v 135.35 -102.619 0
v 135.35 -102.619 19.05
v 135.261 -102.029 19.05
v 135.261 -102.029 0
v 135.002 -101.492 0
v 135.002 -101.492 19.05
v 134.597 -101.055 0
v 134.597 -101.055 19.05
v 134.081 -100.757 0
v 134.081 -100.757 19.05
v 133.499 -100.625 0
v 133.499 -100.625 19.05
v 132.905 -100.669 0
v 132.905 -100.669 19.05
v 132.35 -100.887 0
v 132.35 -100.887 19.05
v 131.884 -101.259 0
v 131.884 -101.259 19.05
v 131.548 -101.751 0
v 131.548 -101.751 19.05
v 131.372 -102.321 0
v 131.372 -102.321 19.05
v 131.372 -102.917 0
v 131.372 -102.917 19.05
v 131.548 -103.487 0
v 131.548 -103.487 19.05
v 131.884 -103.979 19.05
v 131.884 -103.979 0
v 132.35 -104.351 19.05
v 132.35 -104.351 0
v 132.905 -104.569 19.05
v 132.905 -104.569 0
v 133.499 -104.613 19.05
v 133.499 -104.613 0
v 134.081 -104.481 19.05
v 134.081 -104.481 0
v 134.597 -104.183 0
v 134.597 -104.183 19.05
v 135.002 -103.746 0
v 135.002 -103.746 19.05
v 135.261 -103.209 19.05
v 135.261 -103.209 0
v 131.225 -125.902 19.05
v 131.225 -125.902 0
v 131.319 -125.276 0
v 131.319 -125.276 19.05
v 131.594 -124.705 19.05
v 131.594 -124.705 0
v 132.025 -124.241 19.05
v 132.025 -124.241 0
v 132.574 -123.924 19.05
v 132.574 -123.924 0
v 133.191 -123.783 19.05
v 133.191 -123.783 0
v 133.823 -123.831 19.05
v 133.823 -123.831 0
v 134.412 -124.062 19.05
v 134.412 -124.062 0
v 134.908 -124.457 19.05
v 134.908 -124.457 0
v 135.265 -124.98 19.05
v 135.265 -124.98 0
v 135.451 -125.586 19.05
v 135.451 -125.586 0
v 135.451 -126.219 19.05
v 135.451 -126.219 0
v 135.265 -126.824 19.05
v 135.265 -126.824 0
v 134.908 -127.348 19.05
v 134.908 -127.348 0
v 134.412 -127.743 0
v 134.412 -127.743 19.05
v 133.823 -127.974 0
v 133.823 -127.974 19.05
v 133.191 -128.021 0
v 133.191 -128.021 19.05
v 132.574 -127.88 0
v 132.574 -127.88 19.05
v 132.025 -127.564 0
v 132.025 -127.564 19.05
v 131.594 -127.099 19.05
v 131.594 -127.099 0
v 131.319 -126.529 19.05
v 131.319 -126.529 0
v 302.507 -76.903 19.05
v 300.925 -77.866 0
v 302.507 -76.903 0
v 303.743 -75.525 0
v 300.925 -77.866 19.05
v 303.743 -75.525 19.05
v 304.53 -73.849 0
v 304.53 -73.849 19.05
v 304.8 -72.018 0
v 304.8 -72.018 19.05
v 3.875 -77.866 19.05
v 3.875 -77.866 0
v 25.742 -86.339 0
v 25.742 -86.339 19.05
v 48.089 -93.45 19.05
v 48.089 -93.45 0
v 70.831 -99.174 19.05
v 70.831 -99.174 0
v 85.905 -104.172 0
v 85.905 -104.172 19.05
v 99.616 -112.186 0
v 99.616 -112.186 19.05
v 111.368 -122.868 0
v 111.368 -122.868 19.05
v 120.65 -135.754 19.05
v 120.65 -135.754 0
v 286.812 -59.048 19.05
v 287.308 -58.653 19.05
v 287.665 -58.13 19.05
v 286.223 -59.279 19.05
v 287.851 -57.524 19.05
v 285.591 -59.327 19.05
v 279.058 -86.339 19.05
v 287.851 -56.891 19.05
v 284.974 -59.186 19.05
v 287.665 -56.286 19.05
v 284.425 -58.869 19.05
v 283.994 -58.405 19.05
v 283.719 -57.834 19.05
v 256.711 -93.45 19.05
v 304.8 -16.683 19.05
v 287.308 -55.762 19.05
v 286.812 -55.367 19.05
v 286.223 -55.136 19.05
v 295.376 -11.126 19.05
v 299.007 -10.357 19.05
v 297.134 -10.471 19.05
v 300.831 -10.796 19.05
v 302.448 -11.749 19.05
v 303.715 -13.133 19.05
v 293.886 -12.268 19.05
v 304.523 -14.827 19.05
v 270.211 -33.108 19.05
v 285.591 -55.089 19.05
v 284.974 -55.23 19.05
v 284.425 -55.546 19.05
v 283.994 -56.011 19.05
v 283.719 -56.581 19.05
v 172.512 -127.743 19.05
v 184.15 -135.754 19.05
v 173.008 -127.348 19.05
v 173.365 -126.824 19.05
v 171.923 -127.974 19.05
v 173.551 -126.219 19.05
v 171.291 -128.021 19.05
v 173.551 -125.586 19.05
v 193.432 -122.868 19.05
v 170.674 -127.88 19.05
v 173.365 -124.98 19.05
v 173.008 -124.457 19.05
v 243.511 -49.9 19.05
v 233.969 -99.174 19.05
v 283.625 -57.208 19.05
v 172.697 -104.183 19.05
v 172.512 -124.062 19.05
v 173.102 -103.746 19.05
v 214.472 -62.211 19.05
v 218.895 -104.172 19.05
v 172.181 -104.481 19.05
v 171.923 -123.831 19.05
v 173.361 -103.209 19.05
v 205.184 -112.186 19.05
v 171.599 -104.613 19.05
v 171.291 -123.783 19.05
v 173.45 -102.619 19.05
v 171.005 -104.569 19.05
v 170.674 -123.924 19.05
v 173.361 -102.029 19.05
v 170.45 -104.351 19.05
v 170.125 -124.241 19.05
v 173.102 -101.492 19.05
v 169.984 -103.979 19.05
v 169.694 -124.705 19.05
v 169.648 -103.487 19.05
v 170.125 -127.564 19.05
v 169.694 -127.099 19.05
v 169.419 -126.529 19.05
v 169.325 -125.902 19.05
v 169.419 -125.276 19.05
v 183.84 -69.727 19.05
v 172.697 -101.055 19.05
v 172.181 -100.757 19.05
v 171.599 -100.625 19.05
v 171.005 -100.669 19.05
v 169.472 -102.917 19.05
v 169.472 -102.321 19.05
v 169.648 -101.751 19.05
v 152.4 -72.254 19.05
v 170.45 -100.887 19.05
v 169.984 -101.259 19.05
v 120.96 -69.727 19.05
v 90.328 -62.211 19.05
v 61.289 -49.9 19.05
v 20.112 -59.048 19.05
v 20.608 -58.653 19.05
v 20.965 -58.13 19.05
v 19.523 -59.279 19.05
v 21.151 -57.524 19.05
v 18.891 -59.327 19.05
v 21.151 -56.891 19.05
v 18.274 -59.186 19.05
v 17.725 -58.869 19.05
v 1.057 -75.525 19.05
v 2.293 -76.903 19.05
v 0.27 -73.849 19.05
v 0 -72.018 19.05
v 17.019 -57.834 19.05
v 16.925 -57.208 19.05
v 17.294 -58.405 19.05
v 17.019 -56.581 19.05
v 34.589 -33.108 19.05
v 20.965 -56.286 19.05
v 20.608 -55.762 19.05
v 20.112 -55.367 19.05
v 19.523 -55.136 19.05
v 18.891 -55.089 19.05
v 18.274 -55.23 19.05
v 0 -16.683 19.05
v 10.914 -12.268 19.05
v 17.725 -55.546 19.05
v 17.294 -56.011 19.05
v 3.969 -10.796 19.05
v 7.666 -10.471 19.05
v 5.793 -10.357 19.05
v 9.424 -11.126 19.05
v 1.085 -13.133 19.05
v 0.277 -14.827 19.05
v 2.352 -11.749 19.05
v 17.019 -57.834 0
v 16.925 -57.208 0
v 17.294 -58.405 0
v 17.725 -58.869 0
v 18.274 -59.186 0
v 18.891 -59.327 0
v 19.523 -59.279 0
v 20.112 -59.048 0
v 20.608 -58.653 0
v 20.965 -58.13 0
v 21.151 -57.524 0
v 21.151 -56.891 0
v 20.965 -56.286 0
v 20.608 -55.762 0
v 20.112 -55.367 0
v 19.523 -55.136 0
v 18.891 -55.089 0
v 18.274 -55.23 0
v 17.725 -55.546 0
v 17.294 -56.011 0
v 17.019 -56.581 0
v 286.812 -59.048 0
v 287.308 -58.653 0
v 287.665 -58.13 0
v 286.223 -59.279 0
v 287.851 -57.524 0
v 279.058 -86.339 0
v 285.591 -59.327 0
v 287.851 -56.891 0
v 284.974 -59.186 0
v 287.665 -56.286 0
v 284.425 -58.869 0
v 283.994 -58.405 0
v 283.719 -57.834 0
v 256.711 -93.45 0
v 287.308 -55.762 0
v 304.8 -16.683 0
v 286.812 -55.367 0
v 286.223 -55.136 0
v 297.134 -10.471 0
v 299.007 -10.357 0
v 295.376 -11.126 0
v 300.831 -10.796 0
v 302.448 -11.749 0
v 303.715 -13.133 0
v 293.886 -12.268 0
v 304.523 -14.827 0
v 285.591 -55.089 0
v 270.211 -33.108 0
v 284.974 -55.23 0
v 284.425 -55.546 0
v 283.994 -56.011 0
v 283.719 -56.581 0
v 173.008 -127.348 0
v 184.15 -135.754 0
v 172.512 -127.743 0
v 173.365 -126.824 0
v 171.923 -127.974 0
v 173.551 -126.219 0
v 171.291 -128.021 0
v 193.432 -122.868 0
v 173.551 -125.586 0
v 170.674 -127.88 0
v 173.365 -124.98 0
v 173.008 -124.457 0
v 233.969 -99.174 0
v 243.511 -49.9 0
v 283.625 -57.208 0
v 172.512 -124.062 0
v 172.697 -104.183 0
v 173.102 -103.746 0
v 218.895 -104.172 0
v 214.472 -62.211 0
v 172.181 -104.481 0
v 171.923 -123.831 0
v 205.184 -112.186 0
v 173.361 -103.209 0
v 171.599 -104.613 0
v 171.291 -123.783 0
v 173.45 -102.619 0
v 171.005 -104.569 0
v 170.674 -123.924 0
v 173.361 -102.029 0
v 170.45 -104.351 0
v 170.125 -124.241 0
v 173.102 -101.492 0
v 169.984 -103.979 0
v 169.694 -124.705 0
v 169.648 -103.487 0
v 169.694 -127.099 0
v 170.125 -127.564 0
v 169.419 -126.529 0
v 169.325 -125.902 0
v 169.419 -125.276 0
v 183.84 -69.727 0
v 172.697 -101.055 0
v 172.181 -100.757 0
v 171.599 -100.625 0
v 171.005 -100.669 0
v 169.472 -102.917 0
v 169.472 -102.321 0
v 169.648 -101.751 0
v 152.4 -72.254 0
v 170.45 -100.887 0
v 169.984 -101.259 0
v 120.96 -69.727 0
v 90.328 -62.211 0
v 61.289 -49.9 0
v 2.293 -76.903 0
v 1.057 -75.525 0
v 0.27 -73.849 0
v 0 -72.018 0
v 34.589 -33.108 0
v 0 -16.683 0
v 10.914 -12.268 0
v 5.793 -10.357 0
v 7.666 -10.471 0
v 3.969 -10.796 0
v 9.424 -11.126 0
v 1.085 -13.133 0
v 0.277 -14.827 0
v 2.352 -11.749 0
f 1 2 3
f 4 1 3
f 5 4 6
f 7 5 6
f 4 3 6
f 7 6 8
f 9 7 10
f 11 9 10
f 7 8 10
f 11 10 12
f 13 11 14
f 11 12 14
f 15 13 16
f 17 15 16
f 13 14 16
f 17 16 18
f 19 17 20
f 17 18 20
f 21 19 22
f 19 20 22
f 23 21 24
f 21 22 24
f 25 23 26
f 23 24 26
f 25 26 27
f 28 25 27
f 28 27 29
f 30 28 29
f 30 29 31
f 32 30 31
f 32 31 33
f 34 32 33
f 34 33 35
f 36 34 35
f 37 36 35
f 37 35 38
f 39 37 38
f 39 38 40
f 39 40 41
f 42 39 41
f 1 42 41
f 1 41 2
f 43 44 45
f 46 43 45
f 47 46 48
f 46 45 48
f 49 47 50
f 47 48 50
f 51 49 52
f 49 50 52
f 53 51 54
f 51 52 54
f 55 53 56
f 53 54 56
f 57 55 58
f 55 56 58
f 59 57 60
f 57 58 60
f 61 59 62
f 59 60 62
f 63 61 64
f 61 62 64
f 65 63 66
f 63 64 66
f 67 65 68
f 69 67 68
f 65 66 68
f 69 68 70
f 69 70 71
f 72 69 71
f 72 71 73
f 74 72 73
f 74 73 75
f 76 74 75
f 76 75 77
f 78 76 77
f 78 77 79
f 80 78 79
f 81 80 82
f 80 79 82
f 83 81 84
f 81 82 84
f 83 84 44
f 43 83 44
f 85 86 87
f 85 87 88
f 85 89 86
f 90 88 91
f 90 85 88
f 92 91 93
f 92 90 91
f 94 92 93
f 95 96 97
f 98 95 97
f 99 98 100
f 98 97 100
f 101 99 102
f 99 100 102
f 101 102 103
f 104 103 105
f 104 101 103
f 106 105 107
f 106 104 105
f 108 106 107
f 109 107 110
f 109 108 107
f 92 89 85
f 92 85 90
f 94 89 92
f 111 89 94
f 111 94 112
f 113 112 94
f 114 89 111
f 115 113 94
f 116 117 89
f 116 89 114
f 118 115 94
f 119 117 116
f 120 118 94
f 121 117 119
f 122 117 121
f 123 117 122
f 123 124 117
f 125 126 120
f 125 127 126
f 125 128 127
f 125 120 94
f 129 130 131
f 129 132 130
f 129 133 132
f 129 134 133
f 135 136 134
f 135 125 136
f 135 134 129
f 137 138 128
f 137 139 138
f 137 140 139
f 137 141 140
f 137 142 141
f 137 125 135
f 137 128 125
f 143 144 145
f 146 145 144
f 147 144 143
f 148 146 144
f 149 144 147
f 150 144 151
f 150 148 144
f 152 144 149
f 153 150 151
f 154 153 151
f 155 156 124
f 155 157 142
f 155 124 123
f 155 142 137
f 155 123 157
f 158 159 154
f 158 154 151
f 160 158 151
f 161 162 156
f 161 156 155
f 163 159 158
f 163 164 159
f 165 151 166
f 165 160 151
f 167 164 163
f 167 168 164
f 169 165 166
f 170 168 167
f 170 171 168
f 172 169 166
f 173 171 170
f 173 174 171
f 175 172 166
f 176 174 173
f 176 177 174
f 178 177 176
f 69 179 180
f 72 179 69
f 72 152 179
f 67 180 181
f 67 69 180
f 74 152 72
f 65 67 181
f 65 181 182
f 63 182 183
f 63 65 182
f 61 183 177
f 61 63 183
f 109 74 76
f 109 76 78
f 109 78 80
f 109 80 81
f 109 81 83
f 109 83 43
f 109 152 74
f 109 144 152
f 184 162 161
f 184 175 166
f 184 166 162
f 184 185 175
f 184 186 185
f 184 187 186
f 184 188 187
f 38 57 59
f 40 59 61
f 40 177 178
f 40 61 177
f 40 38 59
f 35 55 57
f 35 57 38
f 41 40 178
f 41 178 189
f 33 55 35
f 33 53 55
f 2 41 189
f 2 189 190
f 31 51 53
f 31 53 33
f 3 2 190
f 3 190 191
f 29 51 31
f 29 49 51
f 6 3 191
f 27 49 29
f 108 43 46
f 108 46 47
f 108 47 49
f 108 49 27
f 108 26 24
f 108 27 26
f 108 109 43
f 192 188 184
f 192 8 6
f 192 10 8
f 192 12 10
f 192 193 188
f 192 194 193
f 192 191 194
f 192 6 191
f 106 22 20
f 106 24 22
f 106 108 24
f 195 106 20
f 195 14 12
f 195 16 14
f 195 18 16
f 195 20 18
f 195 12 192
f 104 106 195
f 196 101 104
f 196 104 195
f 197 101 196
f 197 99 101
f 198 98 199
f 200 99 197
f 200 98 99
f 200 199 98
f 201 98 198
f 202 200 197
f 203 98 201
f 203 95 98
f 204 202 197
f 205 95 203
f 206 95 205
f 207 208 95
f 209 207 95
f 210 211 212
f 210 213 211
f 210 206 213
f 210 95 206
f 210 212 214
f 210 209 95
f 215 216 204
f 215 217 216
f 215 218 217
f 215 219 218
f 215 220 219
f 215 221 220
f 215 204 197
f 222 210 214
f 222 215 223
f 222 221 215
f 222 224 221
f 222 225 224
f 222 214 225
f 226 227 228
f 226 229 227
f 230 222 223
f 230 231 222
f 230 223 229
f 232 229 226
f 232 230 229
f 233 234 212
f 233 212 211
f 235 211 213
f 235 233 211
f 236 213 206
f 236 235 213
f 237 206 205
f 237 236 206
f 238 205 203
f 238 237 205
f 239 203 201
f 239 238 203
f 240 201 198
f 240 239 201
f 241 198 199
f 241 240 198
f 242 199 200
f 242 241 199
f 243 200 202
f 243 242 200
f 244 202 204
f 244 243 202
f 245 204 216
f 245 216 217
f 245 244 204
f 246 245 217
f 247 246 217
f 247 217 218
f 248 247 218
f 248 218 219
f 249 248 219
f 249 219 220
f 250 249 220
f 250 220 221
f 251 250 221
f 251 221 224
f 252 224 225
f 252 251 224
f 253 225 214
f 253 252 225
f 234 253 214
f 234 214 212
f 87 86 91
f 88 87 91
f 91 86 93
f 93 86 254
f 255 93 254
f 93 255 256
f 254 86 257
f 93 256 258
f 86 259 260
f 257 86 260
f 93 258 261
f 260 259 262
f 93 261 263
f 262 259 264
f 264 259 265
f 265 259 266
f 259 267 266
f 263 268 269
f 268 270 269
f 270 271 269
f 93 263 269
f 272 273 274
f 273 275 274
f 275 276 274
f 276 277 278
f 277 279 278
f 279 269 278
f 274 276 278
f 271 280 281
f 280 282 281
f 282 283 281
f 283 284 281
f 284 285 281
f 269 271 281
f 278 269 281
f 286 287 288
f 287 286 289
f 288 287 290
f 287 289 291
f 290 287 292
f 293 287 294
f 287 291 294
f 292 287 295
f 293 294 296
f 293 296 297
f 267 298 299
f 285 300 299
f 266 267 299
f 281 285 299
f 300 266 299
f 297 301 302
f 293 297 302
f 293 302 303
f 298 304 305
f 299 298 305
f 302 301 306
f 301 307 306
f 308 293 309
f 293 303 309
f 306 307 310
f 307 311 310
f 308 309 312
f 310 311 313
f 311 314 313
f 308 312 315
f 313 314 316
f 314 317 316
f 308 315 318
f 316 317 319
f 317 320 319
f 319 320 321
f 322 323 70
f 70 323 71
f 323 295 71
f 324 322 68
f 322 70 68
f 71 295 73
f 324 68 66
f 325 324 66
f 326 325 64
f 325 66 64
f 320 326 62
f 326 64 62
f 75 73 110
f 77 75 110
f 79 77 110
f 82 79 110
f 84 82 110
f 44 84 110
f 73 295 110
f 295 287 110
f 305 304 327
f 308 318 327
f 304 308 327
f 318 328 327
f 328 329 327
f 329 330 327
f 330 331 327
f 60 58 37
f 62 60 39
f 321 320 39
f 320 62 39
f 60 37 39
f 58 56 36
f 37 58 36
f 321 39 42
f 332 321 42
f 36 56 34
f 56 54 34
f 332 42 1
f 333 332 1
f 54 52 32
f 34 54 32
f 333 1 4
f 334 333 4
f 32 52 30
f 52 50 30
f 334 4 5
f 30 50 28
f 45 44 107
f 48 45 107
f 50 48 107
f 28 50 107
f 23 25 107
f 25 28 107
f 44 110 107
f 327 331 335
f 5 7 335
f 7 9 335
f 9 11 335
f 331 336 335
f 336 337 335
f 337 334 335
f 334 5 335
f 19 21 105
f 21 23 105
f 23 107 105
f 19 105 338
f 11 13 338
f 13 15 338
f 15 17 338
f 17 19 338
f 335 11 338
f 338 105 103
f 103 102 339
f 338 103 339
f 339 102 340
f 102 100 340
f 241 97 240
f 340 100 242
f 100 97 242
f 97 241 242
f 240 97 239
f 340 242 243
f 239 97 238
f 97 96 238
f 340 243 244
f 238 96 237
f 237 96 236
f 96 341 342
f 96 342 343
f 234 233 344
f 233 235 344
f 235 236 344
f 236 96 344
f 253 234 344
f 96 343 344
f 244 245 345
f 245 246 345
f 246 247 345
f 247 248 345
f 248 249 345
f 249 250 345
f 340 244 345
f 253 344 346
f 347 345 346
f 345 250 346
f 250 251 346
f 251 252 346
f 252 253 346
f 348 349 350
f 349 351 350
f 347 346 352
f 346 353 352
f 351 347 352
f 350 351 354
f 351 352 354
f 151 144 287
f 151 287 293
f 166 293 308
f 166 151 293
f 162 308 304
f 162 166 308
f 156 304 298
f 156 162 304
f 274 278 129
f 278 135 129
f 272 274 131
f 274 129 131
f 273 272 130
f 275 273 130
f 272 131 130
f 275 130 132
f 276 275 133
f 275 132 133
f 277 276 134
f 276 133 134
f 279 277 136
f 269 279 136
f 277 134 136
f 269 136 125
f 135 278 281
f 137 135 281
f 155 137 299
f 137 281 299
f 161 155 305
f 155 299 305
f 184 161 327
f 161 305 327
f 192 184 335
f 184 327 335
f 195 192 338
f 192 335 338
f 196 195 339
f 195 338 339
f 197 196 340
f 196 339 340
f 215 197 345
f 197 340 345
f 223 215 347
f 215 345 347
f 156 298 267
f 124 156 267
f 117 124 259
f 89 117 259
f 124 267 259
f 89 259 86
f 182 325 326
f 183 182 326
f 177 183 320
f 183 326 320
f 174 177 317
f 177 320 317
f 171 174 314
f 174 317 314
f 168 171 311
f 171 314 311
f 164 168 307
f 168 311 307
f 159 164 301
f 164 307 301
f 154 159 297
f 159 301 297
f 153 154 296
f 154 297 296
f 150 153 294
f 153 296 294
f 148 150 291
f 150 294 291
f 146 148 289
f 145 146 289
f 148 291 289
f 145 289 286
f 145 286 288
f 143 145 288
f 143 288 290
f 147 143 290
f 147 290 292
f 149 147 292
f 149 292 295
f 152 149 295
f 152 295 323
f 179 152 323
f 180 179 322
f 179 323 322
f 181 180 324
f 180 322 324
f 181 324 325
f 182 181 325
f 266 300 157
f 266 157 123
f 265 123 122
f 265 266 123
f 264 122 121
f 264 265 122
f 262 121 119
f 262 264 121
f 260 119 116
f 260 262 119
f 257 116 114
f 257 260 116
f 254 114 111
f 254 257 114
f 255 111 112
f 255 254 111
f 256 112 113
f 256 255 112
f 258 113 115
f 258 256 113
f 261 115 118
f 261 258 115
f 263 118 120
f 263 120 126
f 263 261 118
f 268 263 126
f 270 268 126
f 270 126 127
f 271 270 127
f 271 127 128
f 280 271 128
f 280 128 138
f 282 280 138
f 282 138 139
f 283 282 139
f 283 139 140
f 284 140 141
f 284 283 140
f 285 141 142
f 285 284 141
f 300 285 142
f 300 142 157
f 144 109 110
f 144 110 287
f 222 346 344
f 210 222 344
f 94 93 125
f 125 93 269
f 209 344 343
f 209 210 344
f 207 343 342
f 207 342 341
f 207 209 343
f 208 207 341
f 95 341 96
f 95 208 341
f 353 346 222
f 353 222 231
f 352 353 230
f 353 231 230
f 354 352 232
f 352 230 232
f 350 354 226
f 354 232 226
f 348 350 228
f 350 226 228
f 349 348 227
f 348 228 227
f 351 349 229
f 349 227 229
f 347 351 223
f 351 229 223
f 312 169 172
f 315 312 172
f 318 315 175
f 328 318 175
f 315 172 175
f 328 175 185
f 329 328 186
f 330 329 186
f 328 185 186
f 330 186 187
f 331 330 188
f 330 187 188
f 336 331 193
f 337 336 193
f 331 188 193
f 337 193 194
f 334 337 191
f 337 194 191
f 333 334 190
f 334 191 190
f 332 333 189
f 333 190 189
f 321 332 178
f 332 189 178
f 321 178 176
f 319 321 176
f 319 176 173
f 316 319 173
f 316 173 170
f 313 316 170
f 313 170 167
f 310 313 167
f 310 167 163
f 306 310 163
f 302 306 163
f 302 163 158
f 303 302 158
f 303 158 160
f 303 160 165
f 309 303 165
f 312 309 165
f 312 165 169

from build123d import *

# Parameters (mm, degrees)
SKETCH1_R           = 2.125
BOSS_EXTRUDE1_DEPTH = 19.05
FILLET1_R           = 6.35
FILLET2_R           = 6.35
SKETCH3_W           = 63.5
SKETCH3_H           = 63.5
BOSS_EXTRUDE2_DEPTH = 19.05
FILLET3_R           = 76.2
SKETCH8_R           = 2.125
CUT_EXTRUDE3_DEPTH  = 19.05
SKETCH10_R          = 2
CUT_EXTRUDE7_DEPTH  = 335.208156388


with BuildPart() as part:
    # Sketch1 → Boss-Extrude1 (new body)
    with BuildSketch(Plane.XY):
        with BuildLine():
            Line((0, 0), (0, -76.2))
            ThreePointArc((0, -76.2), (152.4, -108.007732044), (304.8, -76.2))
            Line((304.8, -76.2), (304.8, 0))
            ThreePointArc((304.8, 0), (152.4, -72.254002873), (0, 0))
        make_face()
        with Locations(Location((19.05, -57.207732044, 0), (0, 0, 180))):
            Circle(SKETCH1_R, mode=Mode.SUBTRACT)
        with Locations(Location((285.75, -57.207732044, 0), (0, 0, 180))):
            Circle(SKETCH1_R, mode=Mode.SUBTRACT)
    extrude(amount=BOSS_EXTRUDE1_DEPTH)

    # Fillet1
    fillet1_edges = [part.edges().sort_by_distance(p)[0] for p in [
        (304.8, 0, 9.525),
        (0, 0, 9.525),
    ]]
    fillet(fillet1_edges, radius=FILLET1_R)

    # Fillet2
    fillet2_edges = [part.edges().sort_by_distance(p)[0] for p in [
        (304.8, -76.2, 9.525),
        (0, -76.2, 9.525),
    ]]
    fillet(fillet2_edges, radius=FILLET2_R)

    # Sketch3 → Boss-Extrude2 (add)
    with BuildSketch(Plane.XY.offset(19.05)):
        with Locations((152.4, -104.004002873)):
            Rectangle(SKETCH3_W, SKETCH3_H)
    extrude(amount=-BOSS_EXTRUDE2_DEPTH)

    # Fillet3
    # the kernel refuses this fillet: 76.2 mm, written as the material it adds along each edge
    with BuildSketch(Plane(origin=(184.15, -106.682510638, 19.05), x_dir=(0.9888312847973341, 0.1490392237166227, 0), z_dir=(0, 0, -1))) as fillet3_piece_1:
        with BuildLine():
            CenterArc((55.420290143, 76.033258895), FILLET3_R, 218.356834864, 47.852104701)
            Line((-4.332792635, 28.746801018), (-5.527854291, 27.801071861))
            ThreePointArc((-5.527854291, 27.801071861), (-3.673375196, 14.146264732), (-1.506978878, -0.227135777))
            Line((-1.506978878, -0.227135777), (0.100764164, -1.520665178))
            ThreePointArc((0.100764164, -1.520665178), (25.191040974, -0.690294475), (50.281317784, -1.520665178))
            Line((50.281317784, -1.520665178), (50.382081948, 0))
        make_face()
    extrude(amount=19.05)
    with BuildSketch(Plane(origin=(120.65, -106.682510638, 19.05), x_dir=(0, -1, 0), z_dir=(0, 0, -1))) as fillet3_piece_2:
        with BuildLine():
            CenterArc((66.924268059, 66.133254588), FILLET3_R, 192.362312718, 47.852104701)
            Line((-7.508906383, 49.819378823), (-8.997569872, 49.493101308))
            ThreePointArc((-8.997569872, 49.493101308), (-4.437037964, 24.806808459), (-1.518699114, -0.127))
            Line((-1.518699114, -0.127), (0, -1.524))
            ThreePointArc((0, -1.524), (14.535746118, -1.524), (28.314436719, -1.322665092))
            Line((28.314436719, -1.322665092), (29.071492235, 0))
        make_face()
    extrude(amount=19.05)

    # Sketch8 → Cut-Extrude3 (cut)
    with BuildSketch(Plane(origin=(0, 0, 0), x_dir=(-1, 0, 0), z_dir=(0, 0, -1))):
        with Locations((-171.45, -125.902330937)):
            Circle(SKETCH8_R)
        with Locations((-133.35, -125.902330937)):
            Circle(SKETCH8_R)
    extrude(amount=-CUT_EXTRUDE3_DEPTH, mode=Mode.SUBTRACT)

    # Sketch10 → Cut-Extrude7 (cut, through all)
    with BuildSketch(Plane.XY.offset(19.05)):
        with Locations((133.35, -102.618997603)):
            Circle(SKETCH10_R)
        with Locations((171.45, -102.618997603)):
            Circle(SKETCH10_R)
    extrude(amount=-CUT_EXTRUDE7_DEPTH, mode=Mode.SUBTRACT)


solid = part.part
